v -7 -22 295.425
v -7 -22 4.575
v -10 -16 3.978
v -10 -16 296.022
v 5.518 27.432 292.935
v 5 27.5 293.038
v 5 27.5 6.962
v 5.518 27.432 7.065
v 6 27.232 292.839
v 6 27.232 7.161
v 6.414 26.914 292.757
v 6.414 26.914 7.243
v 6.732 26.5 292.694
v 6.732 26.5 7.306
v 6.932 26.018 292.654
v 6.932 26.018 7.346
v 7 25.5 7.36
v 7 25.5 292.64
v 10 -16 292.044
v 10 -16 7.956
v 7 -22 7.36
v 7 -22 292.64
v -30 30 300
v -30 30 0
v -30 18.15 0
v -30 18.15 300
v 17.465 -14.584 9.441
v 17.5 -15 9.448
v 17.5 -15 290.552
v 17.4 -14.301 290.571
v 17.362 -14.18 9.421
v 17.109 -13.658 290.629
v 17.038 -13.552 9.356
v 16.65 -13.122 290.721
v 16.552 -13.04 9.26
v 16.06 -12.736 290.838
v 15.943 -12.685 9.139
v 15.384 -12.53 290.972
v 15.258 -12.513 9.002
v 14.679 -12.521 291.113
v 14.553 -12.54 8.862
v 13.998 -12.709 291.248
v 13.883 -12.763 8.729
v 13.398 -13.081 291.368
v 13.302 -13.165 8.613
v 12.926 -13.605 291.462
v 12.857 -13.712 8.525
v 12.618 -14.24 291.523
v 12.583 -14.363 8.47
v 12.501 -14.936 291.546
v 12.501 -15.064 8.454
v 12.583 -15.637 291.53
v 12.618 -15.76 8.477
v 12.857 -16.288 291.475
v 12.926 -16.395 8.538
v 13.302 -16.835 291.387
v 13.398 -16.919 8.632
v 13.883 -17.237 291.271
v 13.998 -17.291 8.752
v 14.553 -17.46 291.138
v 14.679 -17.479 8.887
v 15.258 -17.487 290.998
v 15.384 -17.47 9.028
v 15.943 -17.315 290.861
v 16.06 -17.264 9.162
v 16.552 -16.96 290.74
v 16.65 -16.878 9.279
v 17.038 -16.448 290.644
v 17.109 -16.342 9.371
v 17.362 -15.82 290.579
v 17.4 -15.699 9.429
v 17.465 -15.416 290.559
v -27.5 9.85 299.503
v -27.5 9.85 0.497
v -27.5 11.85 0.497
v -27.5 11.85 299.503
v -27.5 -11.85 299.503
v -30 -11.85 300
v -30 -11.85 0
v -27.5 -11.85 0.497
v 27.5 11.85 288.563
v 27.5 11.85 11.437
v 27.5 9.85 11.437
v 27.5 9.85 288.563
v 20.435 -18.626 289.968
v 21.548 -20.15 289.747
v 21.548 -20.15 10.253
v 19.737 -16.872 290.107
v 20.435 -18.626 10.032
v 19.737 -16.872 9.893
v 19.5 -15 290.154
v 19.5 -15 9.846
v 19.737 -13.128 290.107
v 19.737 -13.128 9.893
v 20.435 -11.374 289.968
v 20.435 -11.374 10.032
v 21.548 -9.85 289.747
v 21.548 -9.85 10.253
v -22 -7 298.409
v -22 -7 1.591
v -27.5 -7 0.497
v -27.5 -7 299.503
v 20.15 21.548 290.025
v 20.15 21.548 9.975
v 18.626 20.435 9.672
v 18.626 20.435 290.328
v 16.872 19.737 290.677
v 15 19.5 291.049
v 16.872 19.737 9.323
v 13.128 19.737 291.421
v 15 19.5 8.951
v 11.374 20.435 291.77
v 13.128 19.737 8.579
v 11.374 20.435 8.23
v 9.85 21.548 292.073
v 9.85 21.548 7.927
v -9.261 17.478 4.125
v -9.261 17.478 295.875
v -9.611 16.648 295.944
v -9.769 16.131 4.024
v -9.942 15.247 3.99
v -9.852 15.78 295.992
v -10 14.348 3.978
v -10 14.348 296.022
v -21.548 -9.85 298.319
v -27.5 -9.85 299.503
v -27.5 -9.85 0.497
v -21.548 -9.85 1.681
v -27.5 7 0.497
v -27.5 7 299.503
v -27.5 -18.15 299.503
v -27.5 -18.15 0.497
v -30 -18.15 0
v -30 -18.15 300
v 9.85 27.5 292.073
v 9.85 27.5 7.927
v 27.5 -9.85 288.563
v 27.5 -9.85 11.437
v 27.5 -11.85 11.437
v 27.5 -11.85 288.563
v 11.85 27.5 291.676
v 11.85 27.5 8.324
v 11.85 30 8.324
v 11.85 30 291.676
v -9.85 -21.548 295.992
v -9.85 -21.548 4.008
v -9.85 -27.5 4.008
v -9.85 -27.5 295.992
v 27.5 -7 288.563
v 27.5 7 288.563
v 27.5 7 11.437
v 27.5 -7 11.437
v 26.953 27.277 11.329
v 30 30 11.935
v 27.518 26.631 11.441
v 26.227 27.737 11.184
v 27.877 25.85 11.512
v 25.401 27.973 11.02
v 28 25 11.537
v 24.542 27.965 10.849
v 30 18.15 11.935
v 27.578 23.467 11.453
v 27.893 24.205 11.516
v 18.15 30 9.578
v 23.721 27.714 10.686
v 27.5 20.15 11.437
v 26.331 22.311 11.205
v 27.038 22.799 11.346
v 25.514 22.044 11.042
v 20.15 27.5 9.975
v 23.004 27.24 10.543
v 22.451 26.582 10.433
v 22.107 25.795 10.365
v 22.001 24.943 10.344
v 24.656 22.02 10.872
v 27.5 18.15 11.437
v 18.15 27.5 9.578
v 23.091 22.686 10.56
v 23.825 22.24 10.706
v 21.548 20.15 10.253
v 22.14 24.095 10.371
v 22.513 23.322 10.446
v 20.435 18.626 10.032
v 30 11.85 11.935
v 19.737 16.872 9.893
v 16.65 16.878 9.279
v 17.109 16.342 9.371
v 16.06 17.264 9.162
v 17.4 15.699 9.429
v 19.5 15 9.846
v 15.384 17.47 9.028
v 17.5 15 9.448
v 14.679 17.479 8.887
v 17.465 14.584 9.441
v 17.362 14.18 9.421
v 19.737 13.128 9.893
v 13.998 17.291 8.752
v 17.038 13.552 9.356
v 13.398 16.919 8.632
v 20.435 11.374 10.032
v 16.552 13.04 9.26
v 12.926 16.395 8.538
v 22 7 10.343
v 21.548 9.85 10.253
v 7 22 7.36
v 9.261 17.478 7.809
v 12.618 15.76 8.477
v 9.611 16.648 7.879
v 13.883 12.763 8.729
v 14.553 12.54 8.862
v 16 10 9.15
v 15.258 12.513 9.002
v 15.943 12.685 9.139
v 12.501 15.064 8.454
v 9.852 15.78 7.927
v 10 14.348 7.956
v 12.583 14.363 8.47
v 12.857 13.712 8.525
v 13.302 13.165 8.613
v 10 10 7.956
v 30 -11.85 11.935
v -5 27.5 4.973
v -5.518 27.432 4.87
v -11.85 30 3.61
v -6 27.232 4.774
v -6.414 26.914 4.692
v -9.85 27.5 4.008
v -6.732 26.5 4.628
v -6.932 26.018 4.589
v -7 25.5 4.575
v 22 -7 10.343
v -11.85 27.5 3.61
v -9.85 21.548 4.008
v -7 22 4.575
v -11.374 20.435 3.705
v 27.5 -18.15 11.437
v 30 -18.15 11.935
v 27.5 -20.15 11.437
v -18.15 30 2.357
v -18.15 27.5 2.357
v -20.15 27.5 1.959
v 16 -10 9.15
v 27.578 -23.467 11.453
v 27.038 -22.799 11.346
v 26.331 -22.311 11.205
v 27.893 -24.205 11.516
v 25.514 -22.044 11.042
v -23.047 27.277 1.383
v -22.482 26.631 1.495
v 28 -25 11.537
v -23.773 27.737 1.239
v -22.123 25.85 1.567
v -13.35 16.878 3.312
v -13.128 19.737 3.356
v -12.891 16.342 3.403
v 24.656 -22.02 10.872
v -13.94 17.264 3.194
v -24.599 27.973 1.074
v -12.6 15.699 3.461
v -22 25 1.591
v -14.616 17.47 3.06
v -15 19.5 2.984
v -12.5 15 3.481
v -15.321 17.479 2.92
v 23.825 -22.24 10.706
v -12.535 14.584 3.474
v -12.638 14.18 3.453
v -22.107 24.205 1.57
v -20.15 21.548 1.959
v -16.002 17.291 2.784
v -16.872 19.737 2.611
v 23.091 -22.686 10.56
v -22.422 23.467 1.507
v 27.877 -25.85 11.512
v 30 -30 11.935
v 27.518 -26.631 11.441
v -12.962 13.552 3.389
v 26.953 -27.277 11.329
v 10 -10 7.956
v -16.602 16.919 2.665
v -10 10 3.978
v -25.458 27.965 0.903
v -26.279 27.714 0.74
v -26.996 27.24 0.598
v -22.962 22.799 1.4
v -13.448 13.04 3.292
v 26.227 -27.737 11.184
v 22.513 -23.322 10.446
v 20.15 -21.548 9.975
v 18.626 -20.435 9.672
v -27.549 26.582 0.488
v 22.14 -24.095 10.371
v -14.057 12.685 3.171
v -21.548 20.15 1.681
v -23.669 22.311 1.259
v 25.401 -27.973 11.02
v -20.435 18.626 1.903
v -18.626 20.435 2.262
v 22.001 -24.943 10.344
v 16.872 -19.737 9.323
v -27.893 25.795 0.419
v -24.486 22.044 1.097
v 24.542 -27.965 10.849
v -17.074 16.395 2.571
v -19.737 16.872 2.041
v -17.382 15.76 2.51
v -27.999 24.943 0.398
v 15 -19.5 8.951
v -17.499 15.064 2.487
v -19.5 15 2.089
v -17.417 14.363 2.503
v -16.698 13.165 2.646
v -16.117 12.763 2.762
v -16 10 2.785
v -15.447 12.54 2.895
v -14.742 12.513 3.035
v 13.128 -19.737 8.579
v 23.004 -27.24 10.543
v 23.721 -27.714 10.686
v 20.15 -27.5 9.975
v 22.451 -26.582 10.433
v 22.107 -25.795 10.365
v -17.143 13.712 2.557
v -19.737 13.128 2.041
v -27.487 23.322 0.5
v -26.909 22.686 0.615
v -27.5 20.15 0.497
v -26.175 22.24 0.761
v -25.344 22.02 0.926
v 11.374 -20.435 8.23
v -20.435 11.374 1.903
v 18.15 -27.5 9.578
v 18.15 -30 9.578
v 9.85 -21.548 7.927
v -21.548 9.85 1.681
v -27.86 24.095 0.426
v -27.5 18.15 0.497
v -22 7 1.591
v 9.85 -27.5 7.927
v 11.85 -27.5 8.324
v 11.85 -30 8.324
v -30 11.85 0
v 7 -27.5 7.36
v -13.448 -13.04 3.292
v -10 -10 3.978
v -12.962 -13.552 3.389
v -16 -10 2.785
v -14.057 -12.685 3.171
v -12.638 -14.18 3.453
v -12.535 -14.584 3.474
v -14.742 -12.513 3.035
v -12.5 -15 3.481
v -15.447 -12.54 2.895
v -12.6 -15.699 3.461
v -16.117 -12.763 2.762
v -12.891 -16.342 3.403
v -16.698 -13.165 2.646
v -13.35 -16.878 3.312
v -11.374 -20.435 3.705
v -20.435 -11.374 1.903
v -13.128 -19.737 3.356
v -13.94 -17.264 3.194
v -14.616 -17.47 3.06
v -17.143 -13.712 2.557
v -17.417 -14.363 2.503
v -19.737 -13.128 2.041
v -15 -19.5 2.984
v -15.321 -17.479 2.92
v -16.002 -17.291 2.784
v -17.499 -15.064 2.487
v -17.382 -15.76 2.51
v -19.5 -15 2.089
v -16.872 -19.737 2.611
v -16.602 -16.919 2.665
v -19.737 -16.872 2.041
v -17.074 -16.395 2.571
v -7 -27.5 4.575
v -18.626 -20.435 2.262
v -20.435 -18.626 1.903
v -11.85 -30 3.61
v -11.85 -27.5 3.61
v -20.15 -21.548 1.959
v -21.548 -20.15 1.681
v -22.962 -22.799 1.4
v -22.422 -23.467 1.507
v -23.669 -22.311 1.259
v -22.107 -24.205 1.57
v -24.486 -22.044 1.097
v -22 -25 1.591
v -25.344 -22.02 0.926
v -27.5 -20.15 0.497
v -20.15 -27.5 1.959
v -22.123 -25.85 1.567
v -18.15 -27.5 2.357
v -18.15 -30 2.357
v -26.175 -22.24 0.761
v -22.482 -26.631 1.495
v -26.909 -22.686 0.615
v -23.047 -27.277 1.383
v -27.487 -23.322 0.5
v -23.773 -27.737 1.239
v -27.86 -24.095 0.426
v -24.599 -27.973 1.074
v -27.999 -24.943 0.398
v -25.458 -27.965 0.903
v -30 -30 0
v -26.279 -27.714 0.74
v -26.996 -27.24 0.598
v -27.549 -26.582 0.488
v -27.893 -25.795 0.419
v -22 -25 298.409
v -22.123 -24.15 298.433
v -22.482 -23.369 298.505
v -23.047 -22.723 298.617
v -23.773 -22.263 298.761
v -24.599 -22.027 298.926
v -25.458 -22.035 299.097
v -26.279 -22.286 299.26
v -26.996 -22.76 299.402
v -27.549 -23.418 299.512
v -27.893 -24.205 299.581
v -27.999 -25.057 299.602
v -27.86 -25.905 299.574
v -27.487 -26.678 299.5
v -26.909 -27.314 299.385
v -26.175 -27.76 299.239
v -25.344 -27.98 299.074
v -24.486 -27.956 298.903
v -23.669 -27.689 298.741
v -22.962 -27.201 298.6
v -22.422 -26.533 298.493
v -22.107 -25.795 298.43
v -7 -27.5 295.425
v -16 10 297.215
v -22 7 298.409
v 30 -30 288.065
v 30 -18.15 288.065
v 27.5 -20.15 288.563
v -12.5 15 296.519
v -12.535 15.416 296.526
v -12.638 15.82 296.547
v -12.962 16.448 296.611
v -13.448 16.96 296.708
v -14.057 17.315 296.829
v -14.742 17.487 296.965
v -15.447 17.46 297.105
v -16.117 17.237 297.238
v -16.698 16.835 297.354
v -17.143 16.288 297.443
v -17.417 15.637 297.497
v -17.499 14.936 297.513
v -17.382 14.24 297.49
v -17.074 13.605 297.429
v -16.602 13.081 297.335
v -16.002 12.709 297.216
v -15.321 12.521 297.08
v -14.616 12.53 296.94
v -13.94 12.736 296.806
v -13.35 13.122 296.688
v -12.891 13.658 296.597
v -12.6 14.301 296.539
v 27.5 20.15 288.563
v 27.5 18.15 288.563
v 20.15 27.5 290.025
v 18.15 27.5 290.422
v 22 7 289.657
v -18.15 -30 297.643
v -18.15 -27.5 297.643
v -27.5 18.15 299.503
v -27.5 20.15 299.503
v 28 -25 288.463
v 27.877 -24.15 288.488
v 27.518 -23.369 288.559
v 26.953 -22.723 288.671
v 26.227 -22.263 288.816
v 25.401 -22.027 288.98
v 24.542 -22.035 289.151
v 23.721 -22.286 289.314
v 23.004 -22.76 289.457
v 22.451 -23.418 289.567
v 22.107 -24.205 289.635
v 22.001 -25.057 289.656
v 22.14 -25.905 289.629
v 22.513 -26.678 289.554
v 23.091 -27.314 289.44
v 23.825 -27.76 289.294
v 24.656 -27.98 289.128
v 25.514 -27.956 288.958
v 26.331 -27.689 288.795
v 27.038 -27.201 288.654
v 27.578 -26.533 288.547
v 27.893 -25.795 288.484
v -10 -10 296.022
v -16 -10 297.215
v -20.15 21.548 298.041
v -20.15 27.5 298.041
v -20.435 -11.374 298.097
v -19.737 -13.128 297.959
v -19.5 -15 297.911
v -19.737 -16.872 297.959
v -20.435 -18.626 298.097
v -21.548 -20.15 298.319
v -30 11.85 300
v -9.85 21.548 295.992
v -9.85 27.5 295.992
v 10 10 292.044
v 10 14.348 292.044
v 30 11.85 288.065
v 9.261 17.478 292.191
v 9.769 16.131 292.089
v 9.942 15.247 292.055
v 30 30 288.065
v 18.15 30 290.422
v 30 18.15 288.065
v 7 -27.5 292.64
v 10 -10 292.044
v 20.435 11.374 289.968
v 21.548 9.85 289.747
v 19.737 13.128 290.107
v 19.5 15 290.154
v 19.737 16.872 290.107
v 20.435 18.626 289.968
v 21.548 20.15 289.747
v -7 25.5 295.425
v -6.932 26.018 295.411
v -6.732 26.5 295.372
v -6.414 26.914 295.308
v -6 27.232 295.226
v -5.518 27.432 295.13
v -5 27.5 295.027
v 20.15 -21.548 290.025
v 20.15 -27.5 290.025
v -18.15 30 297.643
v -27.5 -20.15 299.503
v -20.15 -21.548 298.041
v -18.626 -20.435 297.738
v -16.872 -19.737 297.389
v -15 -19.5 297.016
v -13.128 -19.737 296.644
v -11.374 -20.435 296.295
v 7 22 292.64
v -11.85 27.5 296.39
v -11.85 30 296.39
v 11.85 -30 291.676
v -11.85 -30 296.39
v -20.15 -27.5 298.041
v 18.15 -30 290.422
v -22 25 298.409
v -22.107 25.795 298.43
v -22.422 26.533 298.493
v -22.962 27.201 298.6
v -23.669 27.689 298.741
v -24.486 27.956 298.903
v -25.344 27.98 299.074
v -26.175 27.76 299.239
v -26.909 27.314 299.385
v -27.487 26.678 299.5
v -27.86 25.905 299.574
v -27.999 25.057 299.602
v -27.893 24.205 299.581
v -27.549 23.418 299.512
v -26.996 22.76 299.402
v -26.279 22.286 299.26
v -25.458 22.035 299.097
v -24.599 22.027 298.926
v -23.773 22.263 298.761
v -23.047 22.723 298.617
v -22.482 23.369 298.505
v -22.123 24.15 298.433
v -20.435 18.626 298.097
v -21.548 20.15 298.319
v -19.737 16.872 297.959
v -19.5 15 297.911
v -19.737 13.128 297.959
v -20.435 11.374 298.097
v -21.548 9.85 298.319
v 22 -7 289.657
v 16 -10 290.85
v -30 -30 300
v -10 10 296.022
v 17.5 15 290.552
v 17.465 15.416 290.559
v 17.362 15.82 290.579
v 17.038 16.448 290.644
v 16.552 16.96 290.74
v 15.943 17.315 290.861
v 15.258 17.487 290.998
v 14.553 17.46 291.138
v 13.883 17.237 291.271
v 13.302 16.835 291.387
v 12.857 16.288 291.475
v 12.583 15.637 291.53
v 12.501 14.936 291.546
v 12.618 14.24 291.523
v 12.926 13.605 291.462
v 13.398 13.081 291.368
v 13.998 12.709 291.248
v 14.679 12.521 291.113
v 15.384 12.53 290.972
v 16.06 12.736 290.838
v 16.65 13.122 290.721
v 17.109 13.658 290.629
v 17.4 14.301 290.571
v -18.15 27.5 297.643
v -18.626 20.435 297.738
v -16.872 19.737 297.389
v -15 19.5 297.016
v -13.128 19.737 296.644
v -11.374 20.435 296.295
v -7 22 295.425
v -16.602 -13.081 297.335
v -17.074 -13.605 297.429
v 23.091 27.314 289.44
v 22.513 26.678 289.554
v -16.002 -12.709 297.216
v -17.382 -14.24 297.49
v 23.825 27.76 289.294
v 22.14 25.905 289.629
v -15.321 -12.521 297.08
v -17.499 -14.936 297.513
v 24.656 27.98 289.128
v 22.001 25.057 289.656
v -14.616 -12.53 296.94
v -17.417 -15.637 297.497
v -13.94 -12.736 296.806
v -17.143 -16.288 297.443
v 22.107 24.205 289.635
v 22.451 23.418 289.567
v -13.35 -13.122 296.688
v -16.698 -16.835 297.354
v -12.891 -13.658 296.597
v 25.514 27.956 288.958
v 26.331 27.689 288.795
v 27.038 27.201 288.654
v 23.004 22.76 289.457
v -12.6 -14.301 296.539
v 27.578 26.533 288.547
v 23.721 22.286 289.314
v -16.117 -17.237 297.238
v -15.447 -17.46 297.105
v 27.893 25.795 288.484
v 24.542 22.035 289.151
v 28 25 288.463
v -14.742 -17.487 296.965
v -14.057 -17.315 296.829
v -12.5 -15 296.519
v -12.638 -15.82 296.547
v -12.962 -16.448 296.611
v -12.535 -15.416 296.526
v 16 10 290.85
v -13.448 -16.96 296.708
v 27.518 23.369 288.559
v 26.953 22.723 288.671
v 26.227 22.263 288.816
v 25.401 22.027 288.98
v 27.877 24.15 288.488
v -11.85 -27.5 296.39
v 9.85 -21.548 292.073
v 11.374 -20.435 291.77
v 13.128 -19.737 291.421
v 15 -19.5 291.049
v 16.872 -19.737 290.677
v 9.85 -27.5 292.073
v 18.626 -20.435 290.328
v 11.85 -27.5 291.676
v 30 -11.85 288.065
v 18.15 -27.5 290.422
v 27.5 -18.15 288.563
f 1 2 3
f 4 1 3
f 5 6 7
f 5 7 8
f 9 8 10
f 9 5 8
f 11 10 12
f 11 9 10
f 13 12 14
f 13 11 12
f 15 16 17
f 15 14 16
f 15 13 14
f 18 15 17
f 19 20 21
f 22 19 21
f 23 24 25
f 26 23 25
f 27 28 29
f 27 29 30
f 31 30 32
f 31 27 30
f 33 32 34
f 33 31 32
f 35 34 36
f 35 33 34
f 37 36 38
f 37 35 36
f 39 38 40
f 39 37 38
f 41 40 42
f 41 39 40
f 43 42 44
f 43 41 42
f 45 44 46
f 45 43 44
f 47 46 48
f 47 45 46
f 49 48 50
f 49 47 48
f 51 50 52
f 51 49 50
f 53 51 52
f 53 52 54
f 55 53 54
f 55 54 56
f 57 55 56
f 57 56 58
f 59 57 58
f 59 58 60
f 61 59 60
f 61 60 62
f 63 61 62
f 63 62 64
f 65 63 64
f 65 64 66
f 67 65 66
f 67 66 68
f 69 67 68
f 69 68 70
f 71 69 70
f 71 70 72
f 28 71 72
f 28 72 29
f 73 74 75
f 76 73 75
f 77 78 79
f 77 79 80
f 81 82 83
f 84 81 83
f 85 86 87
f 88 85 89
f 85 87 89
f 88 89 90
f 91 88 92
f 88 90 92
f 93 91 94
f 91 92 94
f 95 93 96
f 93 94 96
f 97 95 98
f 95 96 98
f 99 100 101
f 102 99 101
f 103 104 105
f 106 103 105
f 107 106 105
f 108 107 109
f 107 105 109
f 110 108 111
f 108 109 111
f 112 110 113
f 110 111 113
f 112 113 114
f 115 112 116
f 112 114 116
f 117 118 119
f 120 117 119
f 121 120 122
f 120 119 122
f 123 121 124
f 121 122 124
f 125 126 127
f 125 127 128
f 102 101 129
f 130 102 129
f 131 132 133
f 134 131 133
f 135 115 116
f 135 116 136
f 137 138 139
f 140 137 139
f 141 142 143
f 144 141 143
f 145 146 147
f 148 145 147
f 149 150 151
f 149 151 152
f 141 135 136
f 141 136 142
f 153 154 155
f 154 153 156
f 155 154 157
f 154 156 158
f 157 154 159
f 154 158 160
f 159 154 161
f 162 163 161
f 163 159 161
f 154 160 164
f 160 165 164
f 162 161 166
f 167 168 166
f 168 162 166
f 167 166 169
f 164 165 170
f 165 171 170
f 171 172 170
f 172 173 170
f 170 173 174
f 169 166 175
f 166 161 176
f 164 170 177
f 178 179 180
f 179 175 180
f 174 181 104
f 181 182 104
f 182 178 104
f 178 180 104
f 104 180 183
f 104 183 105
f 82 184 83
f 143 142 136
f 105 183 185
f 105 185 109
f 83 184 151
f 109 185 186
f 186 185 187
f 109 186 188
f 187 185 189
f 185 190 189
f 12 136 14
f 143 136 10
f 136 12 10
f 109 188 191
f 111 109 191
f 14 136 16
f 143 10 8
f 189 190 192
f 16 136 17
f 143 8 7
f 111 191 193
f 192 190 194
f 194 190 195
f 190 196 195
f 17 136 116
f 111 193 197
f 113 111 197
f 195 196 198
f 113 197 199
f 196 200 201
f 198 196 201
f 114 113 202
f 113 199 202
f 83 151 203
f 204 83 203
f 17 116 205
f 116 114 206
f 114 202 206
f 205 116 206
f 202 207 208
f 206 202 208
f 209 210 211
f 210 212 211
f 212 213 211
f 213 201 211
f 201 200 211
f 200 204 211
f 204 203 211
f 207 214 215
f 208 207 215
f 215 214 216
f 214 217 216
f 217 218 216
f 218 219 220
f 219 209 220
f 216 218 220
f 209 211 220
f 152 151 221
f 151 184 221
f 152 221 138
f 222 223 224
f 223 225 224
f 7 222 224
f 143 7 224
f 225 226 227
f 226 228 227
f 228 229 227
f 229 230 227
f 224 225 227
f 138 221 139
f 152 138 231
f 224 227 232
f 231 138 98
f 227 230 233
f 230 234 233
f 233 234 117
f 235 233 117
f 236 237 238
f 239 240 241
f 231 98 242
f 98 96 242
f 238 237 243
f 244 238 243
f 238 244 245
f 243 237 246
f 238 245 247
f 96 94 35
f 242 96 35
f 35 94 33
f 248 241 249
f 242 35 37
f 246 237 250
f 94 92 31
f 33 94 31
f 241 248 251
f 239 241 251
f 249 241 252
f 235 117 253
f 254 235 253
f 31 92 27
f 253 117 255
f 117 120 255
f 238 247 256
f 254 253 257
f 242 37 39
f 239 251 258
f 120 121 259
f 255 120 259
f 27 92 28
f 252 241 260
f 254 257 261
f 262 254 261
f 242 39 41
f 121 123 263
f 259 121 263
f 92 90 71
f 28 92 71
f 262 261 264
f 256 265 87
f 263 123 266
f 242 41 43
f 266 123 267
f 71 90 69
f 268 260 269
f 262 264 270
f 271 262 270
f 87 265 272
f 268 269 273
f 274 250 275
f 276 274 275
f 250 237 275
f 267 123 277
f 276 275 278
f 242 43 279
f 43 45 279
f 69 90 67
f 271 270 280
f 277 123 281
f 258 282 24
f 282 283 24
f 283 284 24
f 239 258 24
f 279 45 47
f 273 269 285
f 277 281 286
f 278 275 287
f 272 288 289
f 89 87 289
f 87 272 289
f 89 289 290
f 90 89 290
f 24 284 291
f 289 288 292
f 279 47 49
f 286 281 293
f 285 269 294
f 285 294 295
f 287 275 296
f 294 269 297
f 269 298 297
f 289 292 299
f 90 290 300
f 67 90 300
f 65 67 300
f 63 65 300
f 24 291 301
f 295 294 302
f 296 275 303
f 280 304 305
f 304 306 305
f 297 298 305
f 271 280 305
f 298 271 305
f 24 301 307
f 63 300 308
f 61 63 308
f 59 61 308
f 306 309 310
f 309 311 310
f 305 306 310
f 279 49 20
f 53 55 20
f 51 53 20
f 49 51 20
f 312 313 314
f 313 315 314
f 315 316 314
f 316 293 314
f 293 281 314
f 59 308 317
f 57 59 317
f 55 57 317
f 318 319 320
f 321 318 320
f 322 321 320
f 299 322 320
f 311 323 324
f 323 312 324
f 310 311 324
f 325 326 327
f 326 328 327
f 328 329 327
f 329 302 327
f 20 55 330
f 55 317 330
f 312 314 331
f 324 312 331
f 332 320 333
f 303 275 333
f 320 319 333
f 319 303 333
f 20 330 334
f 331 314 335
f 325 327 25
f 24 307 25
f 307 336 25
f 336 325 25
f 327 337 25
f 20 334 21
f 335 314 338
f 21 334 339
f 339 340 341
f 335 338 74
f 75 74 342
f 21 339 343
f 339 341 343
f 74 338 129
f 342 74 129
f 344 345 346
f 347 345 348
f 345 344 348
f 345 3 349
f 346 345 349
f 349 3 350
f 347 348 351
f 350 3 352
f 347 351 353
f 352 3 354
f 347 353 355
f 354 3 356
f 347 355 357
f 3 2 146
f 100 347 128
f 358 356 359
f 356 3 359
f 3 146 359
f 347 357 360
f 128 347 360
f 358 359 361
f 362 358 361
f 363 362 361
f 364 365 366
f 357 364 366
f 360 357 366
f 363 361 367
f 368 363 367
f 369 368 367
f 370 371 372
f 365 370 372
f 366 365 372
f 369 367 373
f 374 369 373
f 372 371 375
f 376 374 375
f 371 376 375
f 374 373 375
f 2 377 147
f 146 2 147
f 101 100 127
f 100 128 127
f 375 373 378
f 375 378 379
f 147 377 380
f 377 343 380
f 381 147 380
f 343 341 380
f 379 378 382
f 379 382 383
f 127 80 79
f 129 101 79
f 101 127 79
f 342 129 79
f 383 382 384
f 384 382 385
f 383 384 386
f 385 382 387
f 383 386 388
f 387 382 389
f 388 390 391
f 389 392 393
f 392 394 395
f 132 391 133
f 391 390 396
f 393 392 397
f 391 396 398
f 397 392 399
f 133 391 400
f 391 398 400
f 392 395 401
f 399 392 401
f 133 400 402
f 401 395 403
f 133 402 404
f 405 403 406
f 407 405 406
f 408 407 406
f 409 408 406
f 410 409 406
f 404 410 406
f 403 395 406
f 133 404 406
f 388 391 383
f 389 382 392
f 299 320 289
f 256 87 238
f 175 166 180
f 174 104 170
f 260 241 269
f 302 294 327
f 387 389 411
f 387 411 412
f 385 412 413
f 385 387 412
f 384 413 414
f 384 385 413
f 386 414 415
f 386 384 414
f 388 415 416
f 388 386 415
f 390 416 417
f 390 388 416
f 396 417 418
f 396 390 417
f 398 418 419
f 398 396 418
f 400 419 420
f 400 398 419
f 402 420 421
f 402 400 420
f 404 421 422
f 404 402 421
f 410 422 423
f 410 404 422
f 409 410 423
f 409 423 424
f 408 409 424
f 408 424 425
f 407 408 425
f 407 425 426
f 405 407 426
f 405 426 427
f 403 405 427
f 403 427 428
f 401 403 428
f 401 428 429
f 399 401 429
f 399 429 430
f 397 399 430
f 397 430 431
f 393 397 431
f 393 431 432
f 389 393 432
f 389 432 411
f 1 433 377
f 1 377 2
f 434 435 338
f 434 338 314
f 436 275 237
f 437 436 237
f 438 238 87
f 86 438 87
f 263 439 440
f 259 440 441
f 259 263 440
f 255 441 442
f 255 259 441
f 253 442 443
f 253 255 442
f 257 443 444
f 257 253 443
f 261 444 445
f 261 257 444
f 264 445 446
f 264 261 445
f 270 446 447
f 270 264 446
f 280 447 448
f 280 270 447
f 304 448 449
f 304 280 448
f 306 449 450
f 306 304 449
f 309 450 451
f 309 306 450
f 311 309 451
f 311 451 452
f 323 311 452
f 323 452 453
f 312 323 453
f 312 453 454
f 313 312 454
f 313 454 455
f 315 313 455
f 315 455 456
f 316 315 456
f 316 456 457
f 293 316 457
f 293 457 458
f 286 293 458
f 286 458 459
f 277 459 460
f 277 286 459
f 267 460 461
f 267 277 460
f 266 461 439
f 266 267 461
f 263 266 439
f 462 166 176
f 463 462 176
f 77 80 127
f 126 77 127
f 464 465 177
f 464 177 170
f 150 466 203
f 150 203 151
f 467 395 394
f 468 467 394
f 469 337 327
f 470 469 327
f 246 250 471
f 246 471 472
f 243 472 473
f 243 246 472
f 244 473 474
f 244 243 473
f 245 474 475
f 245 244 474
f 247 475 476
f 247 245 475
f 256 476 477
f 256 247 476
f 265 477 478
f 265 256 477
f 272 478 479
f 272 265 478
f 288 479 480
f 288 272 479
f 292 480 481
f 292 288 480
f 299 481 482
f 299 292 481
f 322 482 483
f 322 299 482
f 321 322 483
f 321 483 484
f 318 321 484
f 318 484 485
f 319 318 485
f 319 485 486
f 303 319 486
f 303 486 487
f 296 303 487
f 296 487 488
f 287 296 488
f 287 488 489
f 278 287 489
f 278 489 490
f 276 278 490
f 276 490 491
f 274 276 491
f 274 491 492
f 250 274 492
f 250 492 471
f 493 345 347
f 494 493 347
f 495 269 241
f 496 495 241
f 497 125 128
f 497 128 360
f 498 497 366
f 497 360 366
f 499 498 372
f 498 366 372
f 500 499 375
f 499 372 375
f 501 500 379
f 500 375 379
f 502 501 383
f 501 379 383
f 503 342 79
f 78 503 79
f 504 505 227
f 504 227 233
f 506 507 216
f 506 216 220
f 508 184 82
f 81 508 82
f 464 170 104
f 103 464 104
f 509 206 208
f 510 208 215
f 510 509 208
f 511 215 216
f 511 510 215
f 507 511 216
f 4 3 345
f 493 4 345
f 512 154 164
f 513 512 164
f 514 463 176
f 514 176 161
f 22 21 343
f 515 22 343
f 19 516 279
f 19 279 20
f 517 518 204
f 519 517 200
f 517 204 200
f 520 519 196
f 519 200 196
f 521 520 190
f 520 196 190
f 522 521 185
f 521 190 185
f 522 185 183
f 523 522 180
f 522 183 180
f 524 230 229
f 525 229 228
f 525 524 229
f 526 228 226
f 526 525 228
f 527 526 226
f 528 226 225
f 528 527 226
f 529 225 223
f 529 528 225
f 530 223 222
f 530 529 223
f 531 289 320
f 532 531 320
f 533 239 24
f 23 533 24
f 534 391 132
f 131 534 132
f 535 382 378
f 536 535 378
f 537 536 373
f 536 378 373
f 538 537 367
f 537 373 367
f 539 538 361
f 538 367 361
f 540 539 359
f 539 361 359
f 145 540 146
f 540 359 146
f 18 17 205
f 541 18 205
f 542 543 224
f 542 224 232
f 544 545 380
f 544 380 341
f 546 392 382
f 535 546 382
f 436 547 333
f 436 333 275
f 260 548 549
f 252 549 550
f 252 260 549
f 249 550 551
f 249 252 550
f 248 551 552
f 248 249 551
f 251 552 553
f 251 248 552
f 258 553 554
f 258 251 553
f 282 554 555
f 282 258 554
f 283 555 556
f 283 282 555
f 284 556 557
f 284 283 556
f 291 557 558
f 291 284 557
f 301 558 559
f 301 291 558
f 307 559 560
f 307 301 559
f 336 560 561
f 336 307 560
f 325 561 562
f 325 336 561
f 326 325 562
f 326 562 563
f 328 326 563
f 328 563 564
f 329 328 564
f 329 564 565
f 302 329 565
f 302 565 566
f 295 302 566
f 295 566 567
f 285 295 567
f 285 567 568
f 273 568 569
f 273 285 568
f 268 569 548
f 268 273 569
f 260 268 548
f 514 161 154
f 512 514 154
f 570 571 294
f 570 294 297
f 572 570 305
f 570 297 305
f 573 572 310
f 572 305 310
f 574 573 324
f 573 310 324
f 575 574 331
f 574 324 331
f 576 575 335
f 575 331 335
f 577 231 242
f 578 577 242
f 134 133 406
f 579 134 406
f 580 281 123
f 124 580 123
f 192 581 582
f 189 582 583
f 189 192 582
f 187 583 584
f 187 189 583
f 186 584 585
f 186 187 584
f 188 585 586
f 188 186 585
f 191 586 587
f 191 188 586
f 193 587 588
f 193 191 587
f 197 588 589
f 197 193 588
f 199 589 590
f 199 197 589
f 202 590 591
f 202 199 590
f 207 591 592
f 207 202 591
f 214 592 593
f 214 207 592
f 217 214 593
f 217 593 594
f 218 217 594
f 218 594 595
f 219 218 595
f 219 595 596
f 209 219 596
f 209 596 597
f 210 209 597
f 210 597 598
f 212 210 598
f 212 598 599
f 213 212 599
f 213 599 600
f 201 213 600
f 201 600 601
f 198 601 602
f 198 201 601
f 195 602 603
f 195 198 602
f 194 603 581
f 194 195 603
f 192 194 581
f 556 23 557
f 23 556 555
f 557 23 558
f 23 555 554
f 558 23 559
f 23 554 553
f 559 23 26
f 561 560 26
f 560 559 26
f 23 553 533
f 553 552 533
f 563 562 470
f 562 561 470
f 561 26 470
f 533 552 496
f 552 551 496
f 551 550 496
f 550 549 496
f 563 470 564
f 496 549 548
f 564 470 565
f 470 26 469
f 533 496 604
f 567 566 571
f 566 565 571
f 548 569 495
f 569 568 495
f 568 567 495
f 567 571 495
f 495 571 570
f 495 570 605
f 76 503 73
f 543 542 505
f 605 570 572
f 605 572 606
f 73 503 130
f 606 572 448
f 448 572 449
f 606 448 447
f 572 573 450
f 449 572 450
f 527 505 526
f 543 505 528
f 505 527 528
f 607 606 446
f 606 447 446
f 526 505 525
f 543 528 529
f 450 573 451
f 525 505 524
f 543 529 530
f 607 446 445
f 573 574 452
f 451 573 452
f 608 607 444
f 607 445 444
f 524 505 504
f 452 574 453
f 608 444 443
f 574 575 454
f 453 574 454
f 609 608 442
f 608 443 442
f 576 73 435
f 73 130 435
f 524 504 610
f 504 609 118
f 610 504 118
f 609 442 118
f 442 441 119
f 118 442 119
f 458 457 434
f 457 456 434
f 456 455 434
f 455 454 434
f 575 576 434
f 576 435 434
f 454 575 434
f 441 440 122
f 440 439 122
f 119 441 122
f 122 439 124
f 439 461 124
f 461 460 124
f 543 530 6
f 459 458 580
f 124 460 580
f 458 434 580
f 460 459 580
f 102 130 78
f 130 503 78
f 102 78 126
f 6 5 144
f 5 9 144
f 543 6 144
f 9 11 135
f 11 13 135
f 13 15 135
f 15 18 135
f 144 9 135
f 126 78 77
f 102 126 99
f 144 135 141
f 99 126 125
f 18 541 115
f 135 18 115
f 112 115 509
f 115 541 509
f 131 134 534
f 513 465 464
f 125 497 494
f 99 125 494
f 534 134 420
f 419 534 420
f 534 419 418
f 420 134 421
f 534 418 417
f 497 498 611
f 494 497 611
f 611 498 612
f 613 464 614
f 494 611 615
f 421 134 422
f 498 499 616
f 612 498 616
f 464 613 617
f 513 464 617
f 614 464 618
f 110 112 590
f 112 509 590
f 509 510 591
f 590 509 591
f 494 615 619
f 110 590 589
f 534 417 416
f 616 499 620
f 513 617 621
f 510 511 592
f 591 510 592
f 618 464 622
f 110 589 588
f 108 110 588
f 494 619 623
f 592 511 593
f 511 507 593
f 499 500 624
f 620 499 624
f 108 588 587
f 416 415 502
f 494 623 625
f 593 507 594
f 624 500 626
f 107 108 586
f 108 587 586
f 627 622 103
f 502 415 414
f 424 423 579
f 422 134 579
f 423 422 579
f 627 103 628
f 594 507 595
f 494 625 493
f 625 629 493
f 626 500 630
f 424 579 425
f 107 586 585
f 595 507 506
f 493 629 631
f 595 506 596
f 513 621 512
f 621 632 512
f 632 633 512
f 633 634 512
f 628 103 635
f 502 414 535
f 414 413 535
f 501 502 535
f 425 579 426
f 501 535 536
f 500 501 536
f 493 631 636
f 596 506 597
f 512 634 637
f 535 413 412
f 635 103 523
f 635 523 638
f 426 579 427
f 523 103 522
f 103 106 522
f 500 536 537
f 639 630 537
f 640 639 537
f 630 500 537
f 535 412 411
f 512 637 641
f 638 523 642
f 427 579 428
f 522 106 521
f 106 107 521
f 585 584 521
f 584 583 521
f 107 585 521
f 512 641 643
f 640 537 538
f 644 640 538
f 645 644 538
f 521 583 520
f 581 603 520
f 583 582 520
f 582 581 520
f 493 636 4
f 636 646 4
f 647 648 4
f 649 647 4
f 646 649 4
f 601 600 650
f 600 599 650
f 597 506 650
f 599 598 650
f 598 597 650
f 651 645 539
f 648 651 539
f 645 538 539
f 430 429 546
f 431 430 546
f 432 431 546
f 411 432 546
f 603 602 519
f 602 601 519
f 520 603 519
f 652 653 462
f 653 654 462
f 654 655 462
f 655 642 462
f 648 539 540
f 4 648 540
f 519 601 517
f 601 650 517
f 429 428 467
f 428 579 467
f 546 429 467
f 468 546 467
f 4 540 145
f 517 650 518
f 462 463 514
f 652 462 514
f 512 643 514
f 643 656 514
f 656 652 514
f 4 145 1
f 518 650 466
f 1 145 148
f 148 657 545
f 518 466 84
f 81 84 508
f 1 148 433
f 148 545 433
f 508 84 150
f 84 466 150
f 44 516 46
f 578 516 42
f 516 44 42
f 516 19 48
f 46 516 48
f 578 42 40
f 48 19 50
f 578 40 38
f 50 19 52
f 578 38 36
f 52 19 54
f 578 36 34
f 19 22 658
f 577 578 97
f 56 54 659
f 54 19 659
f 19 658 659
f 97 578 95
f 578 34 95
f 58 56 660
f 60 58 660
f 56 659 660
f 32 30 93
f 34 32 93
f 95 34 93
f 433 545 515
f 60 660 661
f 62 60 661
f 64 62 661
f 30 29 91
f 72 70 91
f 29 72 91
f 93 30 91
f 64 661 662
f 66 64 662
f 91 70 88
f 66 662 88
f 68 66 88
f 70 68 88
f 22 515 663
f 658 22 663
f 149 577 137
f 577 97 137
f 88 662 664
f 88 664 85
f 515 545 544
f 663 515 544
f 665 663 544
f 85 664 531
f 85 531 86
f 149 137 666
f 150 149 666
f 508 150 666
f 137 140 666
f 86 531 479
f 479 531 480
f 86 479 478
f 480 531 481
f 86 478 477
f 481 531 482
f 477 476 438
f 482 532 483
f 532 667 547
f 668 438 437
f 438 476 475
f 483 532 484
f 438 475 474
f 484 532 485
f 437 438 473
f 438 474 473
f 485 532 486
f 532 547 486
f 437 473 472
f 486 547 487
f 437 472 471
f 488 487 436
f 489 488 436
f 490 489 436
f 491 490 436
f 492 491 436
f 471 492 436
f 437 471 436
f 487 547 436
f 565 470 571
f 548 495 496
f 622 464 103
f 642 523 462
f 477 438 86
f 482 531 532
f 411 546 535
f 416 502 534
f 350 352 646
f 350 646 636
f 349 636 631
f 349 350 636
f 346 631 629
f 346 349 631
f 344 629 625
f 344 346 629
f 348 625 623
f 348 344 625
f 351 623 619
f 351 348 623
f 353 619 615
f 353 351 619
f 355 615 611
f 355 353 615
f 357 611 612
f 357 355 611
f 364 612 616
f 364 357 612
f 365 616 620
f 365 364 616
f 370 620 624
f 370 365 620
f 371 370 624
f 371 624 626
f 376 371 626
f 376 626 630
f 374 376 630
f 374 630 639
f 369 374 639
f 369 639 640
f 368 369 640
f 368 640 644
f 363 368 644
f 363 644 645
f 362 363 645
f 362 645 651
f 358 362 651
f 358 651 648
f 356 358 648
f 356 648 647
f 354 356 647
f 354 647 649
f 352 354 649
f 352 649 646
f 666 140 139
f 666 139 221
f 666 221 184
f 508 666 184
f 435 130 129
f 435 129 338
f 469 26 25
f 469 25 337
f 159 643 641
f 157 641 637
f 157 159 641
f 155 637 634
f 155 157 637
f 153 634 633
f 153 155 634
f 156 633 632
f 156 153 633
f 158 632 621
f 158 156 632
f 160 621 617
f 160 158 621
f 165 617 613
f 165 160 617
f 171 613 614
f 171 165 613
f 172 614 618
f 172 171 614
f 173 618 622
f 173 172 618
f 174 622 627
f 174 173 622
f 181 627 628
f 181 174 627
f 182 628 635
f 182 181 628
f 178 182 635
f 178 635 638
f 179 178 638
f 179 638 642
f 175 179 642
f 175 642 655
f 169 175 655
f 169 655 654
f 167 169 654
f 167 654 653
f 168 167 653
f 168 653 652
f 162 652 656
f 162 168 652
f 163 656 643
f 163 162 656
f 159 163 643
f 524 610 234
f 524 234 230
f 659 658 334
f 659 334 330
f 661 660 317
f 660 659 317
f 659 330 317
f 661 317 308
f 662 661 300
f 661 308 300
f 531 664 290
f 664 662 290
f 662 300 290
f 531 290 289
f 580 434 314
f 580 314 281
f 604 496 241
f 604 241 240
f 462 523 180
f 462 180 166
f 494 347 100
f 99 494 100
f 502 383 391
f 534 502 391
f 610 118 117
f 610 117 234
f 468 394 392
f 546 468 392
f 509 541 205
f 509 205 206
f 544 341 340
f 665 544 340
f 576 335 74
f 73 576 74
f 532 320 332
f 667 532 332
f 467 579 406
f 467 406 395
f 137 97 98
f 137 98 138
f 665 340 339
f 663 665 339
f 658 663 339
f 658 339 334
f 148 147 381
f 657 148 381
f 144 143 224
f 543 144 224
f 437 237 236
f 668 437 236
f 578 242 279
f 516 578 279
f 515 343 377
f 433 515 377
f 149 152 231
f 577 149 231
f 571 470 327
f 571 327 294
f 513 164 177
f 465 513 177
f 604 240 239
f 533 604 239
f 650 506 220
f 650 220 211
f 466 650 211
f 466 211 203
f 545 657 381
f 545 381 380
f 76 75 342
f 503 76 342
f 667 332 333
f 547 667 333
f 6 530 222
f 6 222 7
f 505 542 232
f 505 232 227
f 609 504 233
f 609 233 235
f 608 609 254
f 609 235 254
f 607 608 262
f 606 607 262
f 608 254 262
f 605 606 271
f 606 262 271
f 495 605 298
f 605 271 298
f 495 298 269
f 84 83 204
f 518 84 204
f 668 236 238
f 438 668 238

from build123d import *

# Parameters (mm, degrees)
F0_R          = 3
F0_R_2        = 2.5
F1_DEPTH      = 300
F2_R          = 2
F3_R          = 7
F6_DEPTH      = 30
F6_DEPTH_BACK = 30


# Not quite as in the source:
# - a feature names something its author has since deleted; it is built from what else it names


with BuildPart() as f1:
    # F0 (on Top) → F1 (new body)
    with BuildSketch(Plane.XY):
        with BuildLine():
            Line((18.15, -30), (30, -30))
            Line((30, -30), (30, -18.15))
            Line((30, -18.15), (27.5, -18.15))
            Line((27.5, -18.15), (27.5, -20.15))
            Line((27.5, -20.15), (21.5477069044, -20.15))
            ThreePointArc((21.5477069044, -20.15), (19.5, -15), (21.5477069044, -9.85))
            Line((21.5477069044, -9.85), (27.5, -9.85))
            Line((27.5, -9.85), (27.5, -11.85))
            Line((27.5, -11.85), (30, -11.85))
            Line((30, -11.85), (30, 11.85))
            Line((30, 11.85), (27.5, 11.85))
            Line((27.5, 11.85), (27.5, 9.85))
            Line((27.5, 9.85), (21.5477069044, 9.85))
            ThreePointArc((21.5477069044, 9.85), (19.5, 15), (21.5477069044, 20.15))
            Line((21.5477069044, 20.15), (27.5, 20.15))
            Line((27.5, 20.15), (27.5, 18.15))
            Line((27.5, 18.15), (30, 18.15))
            Line((30, 18.15), (30, 30))
            Line((30, 30), (18.15, 30))
            Line((18.15, 30), (18.15, 27.5))
            Line((18.15, 27.5), (20.15, 27.5))
            Line((20.15, 27.5), (20.15, 21.5477069044))
            ThreePointArc((20.15, 21.5477069044), (15, 19.5), (9.85, 21.5477069044))
            Line((9.85, 21.5477069044), (9.85, 27.5))
            Line((9.85, 27.5), (11.85, 27.5))
            Line((11.85, 27.5), (11.85, 30))
            Line((11.85, 30), (-11.85, 30))
            Line((-11.85, 30), (-11.85, 27.5))
            Line((-11.85, 27.5), (-9.85, 27.5))
            Line((-9.85, 27.5), (-9.85, 21.5477069044))
            ThreePointArc((-9.85, 21.5477069044), (-15, 19.5), (-20.15, 21.5477069044))
            Line((-20.15, 21.5477069044), (-20.15, 27.5))
            Line((-20.15, 27.5), (-18.15, 27.5))
            Line((-18.15, 27.5), (-18.15, 30))
            Line((-18.15, 30), (-30, 30))
            Line((-30, 30), (-30, 18.15))
            Line((-30, 18.15), (-27.5, 18.15))
            Line((-27.5, 18.15), (-27.5, 20.15))
            Line((-27.5, 20.15), (-21.5477069044, 20.15))
            ThreePointArc((-21.5477069044, 20.15), (-19.5, 15), (-21.5477069044, 9.85))
            Line((-21.5477069044, 9.85), (-27.5, 9.85))
            Line((-27.5, 9.85), (-27.5, 11.85))
            Line((-27.5, 11.85), (-30, 11.85))
            Line((-30, 11.85), (-30, -11.85))
            Line((-30, -11.85), (-27.5, -11.85))
            Line((-27.5, -11.85), (-27.5, -9.85))
            Line((-27.5, -9.85), (-21.5477069044, -9.85))
            ThreePointArc((-21.5477069044, -9.85), (-19.5, -15), (-21.5477069044, -20.15))
            Line((-21.5477069044, -20.15), (-27.5, -20.15))
            Line((-27.5, -20.15), (-27.5, -18.15))
            Line((-27.5, -18.15), (-30, -18.15))
            Line((-30, -18.15), (-30, -30))
            Line((-30, -30), (-18.15, -30))
            Line((-18.15, -30), (-18.15, -27.5))
            Line((-18.15, -27.5), (-20.15, -27.5))
            Line((-20.15, -27.5), (-20.15, -21.5477069044))
            ThreePointArc((-20.15, -21.5477069044), (-15, -19.5), (-9.85, -21.5477069044))
            Line((-9.85, -21.5477069044), (-9.85, -27.5))
            Line((-9.85, -27.5), (-11.85, -27.5))
            Line((-11.85, -27.5), (-11.85, -30))
            Line((-11.85, -30), (11.85, -30))
            Line((11.85, -30), (11.85, -27.5))
            Line((11.85, -27.5), (9.85, -27.5))
            Line((9.85, -27.5), (9.85, -21.5477069044))
            ThreePointArc((9.85, -21.5477069044), (15, -19.5), (20.15, -21.5477069044))
            Line((20.15, -21.5477069044), (20.15, -27.5))
            Line((20.15, -27.5), (18.15, -27.5))
            Line((18.15, -27.5), (18.15, -30))
        make_face()
        with Locations((-25, -25)):
            Circle(F0_R, mode=Mode.SUBTRACT)
        with Locations((-15, -15)):
            Circle(F0_R_2, mode=Mode.SUBTRACT)
        with Locations((25, -25)):
            Circle(F0_R, mode=Mode.SUBTRACT)
        with Locations((15, -15)):
            Circle(F0_R_2, mode=Mode.SUBTRACT)
        with Locations((-25, 25)):
            Circle(F0_R, mode=Mode.SUBTRACT)
        with Locations((-15, 15)):
            Circle(F0_R_2, mode=Mode.SUBTRACT)
        Polygon((-7, 22), (-7, 27.5), (0, 27.5), (7, 27.5), (7, 22), (10, 16), (10, 10), (16, 10), (22, 7), (27.5, 7), (27.5, 0), (27.5, -7), (22, -7), (16, -10), (10, -10), (10, -16), (7, -22), (7, -27.5), (0, -27.5), (-7, -27.5), (-7, -22), (-10, -16), (-10, -10), (-16, -10), (-22, -7), (-27.5, -7), (-27.5, 0), (-27.5, 7), (-22, 7), (-16, 10), (-10, 10), (-10, 16), align=None, mode=Mode.SUBTRACT)
        with Locations((15, 15)):
            Circle(F0_R_2, mode=Mode.SUBTRACT)
        with Locations((25, 25)):
            Circle(F0_R, mode=Mode.SUBTRACT)
    extrude(amount=F1_DEPTH)

    # F2
    f2_edges = [f1.edges().sort_by_distance(p)[0] for p in [
        (-7, 27.5, 150),
        (7, 27.5, 150),
    ]]
    fillet(f2_edges, radius=F2_R)

    # F3
    f3_edges = [f1.edges().sort_by_distance(p)[0] for p in [
        (-10, 16, 150),
        (10, 16, 150),
    ]]
    fillet(f3_edges, radius=F3_R)

    # F5 (on Front) → F6 (cut, two sides)
    with BuildSketch(Plane.XZ) as f6_sk:
        Polygon((-5.0746062651, -125.30841628), (210.6737913168, -82.3933917586), (185.748397582, 42.9150245214), (-30, 0), align=None)
        Polygon((73.2666294749, 279.4589902598), (110.3184495721, 465.7310686897), (7.0518200972, 486.2720784299), (-30, 300), align=None)
    extrude(amount=F6_DEPTH, mode=Mode.SUBTRACT)
    extrude(f6_sk.sketch, amount=-F6_DEPTH_BACK, mode=Mode.SUBTRACT)


solid = f1.part
